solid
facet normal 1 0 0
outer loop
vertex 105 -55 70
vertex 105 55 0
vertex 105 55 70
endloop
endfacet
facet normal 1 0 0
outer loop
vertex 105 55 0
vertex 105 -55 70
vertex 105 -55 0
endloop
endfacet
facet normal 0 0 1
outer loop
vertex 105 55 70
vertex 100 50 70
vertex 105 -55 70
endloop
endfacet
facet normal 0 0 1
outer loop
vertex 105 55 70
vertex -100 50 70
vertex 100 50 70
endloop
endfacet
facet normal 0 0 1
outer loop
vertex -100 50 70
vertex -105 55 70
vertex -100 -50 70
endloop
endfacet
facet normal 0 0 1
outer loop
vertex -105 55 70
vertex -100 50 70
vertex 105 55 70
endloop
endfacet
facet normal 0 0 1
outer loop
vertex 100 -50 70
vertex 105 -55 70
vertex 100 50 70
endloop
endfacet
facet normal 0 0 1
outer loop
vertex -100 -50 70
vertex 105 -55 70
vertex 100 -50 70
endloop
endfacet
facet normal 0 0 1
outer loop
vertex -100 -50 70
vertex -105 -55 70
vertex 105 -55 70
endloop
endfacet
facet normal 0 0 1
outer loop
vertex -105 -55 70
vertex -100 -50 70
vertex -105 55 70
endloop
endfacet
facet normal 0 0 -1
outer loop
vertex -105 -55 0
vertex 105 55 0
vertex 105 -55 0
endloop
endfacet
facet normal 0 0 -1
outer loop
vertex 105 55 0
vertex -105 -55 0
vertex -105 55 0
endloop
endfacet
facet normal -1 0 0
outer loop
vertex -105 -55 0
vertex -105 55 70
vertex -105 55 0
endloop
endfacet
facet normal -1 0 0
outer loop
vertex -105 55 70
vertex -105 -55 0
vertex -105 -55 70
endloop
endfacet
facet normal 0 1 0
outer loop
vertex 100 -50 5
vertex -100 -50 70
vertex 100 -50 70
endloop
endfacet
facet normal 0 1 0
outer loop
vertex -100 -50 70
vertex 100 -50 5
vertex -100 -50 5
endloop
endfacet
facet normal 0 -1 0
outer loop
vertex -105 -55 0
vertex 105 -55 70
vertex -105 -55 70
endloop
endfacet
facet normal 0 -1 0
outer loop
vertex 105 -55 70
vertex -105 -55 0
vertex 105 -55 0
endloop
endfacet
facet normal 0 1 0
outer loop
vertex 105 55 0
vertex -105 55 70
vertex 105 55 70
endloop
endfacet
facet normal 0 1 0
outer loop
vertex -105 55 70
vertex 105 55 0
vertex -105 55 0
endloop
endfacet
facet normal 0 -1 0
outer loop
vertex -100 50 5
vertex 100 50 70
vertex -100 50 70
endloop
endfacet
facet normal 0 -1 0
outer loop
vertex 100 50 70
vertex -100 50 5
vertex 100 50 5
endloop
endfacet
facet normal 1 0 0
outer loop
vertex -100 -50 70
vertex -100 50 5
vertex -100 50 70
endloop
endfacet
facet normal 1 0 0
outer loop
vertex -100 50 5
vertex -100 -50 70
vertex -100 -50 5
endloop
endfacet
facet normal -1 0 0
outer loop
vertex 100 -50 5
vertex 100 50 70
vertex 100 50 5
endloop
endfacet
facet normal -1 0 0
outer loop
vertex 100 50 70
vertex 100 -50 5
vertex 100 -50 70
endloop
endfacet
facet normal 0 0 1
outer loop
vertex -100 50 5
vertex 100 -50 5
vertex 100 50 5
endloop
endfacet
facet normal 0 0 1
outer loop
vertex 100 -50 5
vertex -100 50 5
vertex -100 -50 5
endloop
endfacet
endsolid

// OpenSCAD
/*
Parametric box

Description: Print a box to hold a given number of items of a specified size.

Configuration:
- Uncomment one of the "Size configuration" sections.
- Set the items variable to the desired amount.
- Set wall_thickness if you want to.
- Check the size of the resulting model before printing!

Git repository: http://github.com/l0b0/parametric-box

Thingiverse: http://www.thingiverse.com/thing:4448

Copyright (C) 2010 Victor Engmark

This program is free software: you can redistribute it and/or modify it under the terms of the GNU General Public License as published by the Free Software Foundation, either version 3 of the License, or (at your option) any later version.

This program is distributed in the hope that it will be useful, but WITHOUT ANY WARRANTY; without even the implied warranty of MERCHANTABILITY or FITNESS FOR A PARTICULAR PURPOSE.  See the GNU General Public License for more details.

You should have received a copy of the GNU General Public License along with this program.  If not, see <http://www.gnu.org/licenses/>.
*/

/*
Size configuration
Uncomment one of the sections below or set your own
The sizes are as seen from the "front", i.e., the cover of a book or CD.
*/

// Default size in case of no configuration
item_width = 65;
item_height = 100;
item_depth = 25;

/*
// Jewel case <http://en.wikipedia.org/wiki/Optical_disc_packaging#Jewelry_case>, the common size for CDs:
item_width = 142;
item_height = 125;
item_depth = 10;
*/

/*
// Slimline jewel case <http://en.wikipedia.org/wiki/Optical_disc_packaging#Slimline_jewel_case>, used for CD singles:
item_width = 142;
item_height = 125;
item_depth = 7;
*/

/*
// Keep case <http://en.wikipedia.org/wiki/Keep_case>, used for DVDs:
item_width = 135;
item_height = 190;
item_depth = 15;
*/

// Items configuration
// Set how many items you want to be able to fit inside the box.
items = 8;

// Wall configuration
// Set how thick you want the wall (depends too much on aesthetics to auto-generate).
wall_thickness = 5;

module debug_item() {
    cube(size = [item_depth, item_height, item_width]);
}

module debug_items() {
    translate([-exterior_x / 2, -exterior_y / 2, 0]) {
        for( index = [0:items - 1] ) {
            translate ([index * item_depth + wall_thickness, wall_thickness, wall_thickness]) {
                debug_item();
            }
        }
    }
}

// Uncomment this if you want to see the items themselves
//# debug_items();


interior_x = items * item_depth;
interior_y = item_height;
interior_z = item_width;

exterior_x = interior_x + 2 * wall_thickness;
exterior_y = interior_y + 2 * wall_thickness;
exterior_z = interior_z + wall_thickness; // Smaller because of the opening

module top_bottom_plate() {
    cube(size = [exterior_x, wall_thickness, exterior_z]);    
}

module top_bottom() {
    union() {
        top_bottom_plate();
        translate([0, interior_y + wall_thickness, 0]) {
            top_bottom_plate();
        }
    }
}

module left_right_plate() {
    cube(size = [wall_thickness, exterior_y, exterior_z]);        
}

module left_right() {
    union() {
        left_right_plate();
        translate([interior_x + wall_thickness, 0, 0]) {
            left_right_plate();
        }
    }    
}

module back() {
    cube(size = [exterior_x, exterior_y, wall_thickness]);
}

module box() {
    translate([-exterior_x / 2, -exterior_y / 2, 0]) {
        union() {
            top_bottom();
            left_right();
            back();
        }
    }
}

box();
